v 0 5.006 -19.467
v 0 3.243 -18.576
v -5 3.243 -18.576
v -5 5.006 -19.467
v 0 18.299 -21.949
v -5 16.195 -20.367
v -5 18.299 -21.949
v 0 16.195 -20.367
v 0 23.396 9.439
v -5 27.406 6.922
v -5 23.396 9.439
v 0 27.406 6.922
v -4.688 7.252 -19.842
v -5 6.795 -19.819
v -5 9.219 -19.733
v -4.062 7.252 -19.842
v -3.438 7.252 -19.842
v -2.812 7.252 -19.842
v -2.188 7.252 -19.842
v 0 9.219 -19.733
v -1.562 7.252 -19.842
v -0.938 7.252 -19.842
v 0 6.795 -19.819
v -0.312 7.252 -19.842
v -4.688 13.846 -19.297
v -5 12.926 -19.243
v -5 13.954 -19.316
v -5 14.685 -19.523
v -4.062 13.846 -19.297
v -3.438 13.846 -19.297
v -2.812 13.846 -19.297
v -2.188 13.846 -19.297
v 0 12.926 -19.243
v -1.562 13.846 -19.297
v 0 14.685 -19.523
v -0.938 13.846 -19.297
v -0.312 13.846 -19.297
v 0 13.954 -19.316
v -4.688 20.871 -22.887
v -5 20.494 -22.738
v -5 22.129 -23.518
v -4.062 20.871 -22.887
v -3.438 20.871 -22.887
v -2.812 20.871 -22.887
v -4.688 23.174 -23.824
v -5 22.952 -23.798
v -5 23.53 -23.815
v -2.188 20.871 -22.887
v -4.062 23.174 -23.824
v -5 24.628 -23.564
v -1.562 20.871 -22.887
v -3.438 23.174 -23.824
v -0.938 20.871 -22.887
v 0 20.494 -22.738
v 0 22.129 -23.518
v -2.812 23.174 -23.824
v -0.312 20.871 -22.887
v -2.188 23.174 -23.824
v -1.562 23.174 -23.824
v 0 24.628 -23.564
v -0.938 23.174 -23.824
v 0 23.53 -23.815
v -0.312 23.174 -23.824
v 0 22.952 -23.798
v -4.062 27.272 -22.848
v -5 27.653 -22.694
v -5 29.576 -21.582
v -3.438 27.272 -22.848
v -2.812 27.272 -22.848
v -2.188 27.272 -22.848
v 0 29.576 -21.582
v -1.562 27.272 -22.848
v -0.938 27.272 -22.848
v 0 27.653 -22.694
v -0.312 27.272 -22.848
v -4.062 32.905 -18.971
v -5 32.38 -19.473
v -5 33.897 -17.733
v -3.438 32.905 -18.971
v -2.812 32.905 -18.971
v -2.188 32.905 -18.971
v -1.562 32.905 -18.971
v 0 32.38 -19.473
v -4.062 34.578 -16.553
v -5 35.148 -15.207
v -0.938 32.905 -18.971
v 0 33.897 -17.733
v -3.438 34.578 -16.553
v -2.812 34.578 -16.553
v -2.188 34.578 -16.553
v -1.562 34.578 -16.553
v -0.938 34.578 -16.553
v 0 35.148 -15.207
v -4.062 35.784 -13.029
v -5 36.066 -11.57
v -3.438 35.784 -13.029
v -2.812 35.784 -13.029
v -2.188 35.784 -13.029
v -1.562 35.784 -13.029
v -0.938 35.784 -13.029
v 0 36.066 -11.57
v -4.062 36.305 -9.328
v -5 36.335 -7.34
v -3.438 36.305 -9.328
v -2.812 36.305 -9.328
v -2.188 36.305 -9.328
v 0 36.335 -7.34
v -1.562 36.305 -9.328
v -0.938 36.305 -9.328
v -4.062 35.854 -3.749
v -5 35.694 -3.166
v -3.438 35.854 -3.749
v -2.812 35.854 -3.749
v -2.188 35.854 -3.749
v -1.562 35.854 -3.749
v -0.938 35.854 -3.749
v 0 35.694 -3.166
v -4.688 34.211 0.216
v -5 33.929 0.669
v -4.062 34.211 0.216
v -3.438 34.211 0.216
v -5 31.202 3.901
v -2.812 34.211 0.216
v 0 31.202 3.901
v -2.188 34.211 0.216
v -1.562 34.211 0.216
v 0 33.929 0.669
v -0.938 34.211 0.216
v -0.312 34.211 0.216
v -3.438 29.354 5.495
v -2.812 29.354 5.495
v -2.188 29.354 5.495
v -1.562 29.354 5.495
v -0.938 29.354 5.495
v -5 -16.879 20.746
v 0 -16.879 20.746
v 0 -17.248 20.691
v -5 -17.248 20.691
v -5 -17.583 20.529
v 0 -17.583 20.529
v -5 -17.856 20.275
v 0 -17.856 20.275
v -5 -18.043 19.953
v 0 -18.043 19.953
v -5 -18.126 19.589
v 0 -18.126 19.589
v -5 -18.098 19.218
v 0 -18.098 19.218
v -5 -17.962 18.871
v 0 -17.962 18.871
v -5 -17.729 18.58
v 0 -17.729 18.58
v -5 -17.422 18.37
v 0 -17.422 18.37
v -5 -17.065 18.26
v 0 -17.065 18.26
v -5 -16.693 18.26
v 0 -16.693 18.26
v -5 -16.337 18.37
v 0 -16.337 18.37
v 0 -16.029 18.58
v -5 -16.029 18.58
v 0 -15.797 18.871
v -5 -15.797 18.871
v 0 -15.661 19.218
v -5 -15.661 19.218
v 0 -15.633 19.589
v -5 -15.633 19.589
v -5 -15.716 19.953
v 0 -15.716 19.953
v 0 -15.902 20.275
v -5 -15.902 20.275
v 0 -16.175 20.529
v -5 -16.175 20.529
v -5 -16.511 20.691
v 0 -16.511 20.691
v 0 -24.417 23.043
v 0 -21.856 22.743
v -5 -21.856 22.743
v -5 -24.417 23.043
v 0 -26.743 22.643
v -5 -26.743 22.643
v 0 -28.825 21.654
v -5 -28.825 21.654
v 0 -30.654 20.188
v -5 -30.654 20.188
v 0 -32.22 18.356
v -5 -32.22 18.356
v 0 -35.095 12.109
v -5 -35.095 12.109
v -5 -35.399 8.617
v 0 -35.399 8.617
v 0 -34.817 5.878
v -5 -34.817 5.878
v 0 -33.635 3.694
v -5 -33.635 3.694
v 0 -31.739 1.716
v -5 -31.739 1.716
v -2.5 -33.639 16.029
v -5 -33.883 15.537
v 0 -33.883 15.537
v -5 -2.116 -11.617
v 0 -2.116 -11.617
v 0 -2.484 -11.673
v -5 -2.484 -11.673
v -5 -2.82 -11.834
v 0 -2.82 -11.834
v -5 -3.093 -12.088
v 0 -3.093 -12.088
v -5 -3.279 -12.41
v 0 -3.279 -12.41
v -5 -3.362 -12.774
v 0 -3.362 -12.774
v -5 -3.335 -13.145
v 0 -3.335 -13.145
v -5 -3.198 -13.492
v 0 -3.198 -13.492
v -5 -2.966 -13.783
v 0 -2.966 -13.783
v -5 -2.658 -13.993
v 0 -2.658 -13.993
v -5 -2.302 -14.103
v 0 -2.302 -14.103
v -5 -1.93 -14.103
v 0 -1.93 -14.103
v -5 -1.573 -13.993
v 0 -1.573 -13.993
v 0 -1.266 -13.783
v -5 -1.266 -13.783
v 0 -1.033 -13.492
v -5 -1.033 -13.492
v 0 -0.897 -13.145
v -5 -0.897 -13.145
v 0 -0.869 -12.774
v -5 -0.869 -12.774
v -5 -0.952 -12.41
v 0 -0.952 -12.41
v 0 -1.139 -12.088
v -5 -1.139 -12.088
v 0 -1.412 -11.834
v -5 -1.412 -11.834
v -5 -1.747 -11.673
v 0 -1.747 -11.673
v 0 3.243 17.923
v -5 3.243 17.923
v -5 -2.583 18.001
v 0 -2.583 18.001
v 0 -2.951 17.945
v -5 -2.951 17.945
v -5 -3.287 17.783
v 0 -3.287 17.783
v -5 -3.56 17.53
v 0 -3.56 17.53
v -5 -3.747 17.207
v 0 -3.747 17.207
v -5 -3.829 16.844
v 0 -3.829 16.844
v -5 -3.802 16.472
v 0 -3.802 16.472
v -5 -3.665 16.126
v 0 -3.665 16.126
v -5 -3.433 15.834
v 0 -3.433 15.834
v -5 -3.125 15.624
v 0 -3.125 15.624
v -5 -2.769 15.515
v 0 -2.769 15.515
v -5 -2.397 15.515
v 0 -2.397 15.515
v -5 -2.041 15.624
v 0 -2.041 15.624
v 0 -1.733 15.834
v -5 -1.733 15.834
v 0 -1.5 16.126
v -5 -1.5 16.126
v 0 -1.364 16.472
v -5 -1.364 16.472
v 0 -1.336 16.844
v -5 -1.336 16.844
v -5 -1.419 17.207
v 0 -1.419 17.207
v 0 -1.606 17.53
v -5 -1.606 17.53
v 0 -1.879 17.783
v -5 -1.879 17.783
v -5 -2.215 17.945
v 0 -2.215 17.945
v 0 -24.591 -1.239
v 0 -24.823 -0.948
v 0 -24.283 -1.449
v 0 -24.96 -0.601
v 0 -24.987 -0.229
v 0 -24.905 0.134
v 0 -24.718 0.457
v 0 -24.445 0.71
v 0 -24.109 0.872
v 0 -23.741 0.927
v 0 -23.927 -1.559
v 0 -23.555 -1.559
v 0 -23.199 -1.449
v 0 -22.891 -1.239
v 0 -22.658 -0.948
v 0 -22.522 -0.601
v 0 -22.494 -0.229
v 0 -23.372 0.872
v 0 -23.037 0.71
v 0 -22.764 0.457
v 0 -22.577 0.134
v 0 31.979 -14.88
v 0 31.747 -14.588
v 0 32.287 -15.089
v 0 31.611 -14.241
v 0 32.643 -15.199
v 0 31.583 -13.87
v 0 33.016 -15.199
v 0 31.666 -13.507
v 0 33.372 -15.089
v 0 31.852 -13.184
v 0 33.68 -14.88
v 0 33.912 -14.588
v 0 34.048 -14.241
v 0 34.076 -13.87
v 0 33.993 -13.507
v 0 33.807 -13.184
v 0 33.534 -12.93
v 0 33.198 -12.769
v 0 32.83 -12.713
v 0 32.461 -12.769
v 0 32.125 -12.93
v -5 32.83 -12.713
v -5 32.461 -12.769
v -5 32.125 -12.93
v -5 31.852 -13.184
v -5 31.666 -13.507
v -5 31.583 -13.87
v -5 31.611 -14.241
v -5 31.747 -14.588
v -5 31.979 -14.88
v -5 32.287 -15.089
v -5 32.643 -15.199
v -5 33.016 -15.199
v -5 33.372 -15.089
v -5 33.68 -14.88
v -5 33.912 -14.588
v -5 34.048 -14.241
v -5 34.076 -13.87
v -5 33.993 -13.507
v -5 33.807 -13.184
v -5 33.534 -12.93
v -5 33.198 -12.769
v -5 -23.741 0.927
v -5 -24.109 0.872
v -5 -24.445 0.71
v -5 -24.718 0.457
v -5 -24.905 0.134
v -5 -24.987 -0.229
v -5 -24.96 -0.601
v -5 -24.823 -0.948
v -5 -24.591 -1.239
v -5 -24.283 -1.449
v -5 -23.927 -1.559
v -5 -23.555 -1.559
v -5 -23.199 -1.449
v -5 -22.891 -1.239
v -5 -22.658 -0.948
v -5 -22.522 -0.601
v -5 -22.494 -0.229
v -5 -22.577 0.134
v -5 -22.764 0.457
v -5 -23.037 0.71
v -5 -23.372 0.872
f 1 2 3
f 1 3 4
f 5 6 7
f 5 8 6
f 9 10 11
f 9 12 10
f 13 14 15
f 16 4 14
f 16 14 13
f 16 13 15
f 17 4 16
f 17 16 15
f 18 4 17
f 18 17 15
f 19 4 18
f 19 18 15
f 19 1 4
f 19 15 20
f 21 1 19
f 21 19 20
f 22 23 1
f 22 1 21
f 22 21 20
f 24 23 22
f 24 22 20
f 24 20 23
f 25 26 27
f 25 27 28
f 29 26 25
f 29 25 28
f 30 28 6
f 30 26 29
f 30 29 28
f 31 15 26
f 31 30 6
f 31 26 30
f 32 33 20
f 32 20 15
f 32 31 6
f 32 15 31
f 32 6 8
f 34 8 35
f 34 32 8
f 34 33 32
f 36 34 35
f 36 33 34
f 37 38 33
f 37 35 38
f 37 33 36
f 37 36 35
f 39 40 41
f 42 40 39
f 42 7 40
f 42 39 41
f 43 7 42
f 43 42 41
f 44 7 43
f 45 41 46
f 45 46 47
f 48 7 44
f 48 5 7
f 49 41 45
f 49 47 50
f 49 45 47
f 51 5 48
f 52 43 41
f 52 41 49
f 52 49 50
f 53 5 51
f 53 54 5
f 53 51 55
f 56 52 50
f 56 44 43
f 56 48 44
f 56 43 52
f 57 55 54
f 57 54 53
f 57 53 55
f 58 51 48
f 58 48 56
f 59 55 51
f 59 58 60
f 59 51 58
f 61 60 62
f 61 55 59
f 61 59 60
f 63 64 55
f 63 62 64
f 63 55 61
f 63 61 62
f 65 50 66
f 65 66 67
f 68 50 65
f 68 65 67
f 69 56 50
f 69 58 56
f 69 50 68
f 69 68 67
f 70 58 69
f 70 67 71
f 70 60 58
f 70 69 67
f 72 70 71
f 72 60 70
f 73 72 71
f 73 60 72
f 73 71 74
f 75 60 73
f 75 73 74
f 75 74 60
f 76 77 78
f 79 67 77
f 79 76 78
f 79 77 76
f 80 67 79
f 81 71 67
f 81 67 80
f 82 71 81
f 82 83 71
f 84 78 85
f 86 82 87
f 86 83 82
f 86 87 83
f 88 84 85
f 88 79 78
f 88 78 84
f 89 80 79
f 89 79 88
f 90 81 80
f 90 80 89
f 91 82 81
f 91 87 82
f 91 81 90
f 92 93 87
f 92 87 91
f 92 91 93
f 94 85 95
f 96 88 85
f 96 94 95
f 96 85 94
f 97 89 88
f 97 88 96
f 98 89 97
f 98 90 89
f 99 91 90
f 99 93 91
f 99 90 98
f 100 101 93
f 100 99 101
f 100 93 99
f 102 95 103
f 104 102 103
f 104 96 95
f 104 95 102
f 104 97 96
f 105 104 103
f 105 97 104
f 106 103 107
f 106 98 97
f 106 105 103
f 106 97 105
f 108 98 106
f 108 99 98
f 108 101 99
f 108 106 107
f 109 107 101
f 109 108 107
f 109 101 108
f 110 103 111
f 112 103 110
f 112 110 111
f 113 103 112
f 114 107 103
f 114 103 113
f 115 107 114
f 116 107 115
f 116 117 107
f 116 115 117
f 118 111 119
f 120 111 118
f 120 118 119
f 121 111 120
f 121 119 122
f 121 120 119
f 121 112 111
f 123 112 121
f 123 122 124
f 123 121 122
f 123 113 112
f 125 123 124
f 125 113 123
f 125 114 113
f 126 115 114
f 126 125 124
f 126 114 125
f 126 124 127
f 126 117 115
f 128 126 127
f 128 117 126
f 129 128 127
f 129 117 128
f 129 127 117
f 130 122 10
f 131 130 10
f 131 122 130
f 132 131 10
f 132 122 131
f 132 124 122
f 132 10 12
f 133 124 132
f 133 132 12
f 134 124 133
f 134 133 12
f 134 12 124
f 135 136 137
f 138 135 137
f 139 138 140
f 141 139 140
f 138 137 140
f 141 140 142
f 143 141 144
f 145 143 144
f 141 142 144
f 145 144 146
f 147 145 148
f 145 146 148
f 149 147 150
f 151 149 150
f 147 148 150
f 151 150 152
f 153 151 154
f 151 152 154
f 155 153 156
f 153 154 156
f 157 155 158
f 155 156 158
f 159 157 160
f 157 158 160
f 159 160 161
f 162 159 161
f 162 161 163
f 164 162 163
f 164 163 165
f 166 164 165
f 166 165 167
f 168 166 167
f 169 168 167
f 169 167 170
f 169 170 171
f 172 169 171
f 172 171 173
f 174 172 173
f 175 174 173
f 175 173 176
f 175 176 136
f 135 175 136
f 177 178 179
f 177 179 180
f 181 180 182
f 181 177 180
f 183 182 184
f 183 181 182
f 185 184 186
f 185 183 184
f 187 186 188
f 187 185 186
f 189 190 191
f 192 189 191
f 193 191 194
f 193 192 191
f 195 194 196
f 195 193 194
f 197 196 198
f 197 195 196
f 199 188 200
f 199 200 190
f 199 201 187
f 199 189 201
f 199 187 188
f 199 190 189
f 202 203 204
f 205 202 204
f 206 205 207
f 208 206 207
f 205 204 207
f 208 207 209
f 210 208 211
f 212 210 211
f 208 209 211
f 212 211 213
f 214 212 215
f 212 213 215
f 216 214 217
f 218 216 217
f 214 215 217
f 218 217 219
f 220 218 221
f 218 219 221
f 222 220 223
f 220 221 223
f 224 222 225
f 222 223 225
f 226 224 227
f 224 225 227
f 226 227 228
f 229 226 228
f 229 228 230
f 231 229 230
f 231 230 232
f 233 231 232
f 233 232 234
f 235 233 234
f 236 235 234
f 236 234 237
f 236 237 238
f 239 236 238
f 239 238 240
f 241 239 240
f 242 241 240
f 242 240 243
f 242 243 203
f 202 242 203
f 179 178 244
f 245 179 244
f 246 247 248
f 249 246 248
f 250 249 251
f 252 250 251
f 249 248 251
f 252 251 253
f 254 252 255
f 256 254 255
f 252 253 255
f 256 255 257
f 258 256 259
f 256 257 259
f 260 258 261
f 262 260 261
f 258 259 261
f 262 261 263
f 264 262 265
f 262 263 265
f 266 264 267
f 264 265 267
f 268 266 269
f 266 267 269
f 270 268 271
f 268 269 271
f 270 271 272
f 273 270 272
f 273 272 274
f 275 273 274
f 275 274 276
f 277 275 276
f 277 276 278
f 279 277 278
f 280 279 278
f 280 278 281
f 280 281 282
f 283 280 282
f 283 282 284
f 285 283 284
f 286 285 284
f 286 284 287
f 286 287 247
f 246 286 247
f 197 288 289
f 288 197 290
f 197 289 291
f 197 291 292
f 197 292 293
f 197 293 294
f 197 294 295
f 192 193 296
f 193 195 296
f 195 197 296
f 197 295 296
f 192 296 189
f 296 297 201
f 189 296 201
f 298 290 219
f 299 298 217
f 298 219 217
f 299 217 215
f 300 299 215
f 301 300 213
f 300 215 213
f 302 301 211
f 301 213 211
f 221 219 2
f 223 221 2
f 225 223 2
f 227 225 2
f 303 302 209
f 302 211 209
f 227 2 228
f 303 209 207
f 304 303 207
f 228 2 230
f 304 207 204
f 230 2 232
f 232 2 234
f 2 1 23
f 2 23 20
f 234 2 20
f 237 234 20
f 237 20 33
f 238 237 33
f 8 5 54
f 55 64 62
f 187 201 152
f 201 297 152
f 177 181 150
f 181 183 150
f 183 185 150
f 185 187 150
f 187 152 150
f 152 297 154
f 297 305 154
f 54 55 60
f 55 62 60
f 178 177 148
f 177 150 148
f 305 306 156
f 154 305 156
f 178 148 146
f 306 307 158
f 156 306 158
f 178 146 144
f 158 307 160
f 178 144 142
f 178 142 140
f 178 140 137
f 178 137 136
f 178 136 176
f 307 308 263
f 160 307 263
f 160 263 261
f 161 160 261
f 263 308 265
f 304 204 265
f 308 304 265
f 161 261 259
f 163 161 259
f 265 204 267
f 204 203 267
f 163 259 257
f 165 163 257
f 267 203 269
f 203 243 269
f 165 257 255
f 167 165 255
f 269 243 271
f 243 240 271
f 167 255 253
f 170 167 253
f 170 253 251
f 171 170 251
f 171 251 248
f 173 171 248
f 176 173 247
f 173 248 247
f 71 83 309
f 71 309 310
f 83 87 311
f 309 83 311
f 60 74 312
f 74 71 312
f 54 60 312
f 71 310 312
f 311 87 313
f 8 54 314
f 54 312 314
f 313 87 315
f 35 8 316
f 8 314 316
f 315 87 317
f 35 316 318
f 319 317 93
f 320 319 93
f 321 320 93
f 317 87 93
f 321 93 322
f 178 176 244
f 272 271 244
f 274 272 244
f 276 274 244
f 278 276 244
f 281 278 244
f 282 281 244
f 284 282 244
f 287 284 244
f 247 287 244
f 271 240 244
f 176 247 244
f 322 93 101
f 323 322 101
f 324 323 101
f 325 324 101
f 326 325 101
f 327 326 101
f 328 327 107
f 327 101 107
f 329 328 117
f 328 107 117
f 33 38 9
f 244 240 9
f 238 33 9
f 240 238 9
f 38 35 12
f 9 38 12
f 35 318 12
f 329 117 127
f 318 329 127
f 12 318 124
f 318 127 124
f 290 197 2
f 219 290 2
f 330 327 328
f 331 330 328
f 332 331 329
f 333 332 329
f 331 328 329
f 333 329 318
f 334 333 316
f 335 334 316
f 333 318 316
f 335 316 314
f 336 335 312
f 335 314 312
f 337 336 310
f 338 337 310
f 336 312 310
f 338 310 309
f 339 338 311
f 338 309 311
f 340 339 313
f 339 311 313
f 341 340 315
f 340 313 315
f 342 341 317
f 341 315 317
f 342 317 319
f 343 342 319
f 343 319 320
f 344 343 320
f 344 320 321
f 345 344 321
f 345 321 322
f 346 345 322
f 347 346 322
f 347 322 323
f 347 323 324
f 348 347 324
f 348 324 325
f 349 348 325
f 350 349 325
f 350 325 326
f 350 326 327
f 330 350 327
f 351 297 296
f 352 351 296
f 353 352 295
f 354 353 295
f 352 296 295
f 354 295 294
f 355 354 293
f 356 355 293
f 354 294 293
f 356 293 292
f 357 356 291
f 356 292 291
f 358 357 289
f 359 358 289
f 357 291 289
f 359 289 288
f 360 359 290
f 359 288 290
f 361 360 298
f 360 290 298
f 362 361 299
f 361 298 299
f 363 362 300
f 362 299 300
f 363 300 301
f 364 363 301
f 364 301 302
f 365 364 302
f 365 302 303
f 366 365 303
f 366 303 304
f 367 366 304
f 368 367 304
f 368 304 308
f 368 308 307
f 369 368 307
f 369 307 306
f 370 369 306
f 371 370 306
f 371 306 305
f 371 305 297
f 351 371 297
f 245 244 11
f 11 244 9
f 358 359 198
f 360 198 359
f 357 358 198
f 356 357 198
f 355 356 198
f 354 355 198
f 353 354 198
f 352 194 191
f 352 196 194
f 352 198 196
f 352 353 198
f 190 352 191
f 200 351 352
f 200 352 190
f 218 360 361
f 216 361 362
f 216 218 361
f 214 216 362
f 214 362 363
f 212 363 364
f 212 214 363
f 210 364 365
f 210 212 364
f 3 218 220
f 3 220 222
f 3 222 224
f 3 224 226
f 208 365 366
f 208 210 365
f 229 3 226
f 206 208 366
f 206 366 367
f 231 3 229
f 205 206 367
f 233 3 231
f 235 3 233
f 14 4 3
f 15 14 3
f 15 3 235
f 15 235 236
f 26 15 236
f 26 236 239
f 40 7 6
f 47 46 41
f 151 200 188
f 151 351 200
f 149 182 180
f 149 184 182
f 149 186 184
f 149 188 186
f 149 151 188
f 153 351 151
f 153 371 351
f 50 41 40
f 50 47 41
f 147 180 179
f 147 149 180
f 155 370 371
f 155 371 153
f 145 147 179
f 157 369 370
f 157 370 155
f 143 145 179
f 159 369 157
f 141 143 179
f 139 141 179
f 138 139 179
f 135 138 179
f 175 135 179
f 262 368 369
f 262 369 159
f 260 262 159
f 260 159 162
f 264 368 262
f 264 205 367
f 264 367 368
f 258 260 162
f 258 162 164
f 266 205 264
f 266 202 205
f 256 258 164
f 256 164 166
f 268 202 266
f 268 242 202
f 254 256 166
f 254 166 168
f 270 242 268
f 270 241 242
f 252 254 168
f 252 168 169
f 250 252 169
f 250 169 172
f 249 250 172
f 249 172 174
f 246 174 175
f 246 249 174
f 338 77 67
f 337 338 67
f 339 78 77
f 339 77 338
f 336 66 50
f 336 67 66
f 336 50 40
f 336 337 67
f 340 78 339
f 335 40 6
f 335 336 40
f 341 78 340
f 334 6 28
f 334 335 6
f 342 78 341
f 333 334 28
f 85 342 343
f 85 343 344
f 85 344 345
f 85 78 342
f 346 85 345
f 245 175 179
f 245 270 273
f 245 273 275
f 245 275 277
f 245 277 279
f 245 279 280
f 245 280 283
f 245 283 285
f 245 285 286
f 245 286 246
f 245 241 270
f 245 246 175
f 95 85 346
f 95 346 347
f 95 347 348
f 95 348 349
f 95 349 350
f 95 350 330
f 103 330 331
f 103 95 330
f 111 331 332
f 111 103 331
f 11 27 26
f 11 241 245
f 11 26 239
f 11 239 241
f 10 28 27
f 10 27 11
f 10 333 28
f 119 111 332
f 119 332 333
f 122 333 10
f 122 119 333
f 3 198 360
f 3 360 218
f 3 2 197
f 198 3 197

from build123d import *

# Parameters (mm, degrees)
BOSS_EXTRUDE1_DEPTH = 5
SKETCH2_R           = 1.25
CUT_EXTRUDE2_DEPTH  = 100


with BuildPart() as part:
    # Sketch1 → Boss-Extrude1 (new body)
    with BuildSketch(Plane(origin=(0, 0, 0), x_dir=(0, 0, -1), z_dir=(1, 0, 0))):
        with BuildLine():
            Line((-22.742960493, -21.856113648), (-17.922876831, 3.242686009))
            Line((-17.922876831, 3.242686009), (-9.438985974, 23.395908543))
            add(Edge.make_bspline(
                [(18.57649003, 3.242686009), (20.399875341, 5.871472338), (19.686678584, 9.392169109), (19.056732911, 13.819256879), (20.207128324, 16.284698509), (22.236157968, 18.154123407), (22.664736548, 20.900077477), (24.142385136, 22.874612328), (23.371166039, 25.110417667), (22.923217745, 27.756618982), (21.020450988, 30.360376627), (19.111474243, 33.014652762), (16.820610384, 34.5537712), (13.572626531, 35.783515921), (9.241399662, 36.514487685), (4.112699816, 36.229915261), (-3.478859823, 33.086265385), (-7.117399203, 27.318143956), (-9.438985974, 23.395908543)],
                knots=[0, 0, 0, 0, 0.124663564, 0.161437725, 0.195659694, 0.241956702, 0.28031453, 0.317452049, 0.342380683, 0.380427051, 0.438288461, 0.482854303, 0.52677939, 0.559206089, 0.638222424, 0.721837052, 0.785951738, 1, 1, 1, 1], degree=3))
            Line((18.57649003, 3.242686009), (-1.715623911, -31.739081671))
            add(Edge.make_bspline(
                [(-22.742960493, -21.856113648), (-24.142385136, -27.302834512), (-16.603948378, -35.664651683), (-5.598094876, -36.514487685), (-1.715623911, -31.739081671)],
                knots=[0, 0, 0, 0, 0.48418997, 1, 1, 1, 1], degree=3))
        make_face()
    extrude(amount=-BOSS_EXTRUDE1_DEPTH)

    # Sketch2 → Cut-Extrude2 (cut)
    with BuildSketch(Plane(origin=(53, 0, 0), x_dir=(0, 0, -1), z_dir=(1, 0, 0))):
        with Locations(Location((-16.750543677, -2.582958588, 0), (0, 0, 180))):
            Circle(SKETCH2_R)
        with Locations(Location((-19.496048989, -16.879160193, 0), (0, 0, 180))):
            Circle(SKETCH2_R)
        with Locations(Location((0.322780066, -23.740912204, 0), (0, 0, 180))):
            Circle(SKETCH2_R)
        with Locations(Location((12.866975999, -2.11585386, 0), (0, 0, 180))):
            Circle(SKETCH2_R)
        with Locations(Location((13.963221564, 32.829570985, 0), (0, 0, 180))):
            Circle(SKETCH2_R)
    extrude(amount=-CUT_EXTRUDE2_DEPTH, mode=Mode.SUBTRACT)


solid = part.part
